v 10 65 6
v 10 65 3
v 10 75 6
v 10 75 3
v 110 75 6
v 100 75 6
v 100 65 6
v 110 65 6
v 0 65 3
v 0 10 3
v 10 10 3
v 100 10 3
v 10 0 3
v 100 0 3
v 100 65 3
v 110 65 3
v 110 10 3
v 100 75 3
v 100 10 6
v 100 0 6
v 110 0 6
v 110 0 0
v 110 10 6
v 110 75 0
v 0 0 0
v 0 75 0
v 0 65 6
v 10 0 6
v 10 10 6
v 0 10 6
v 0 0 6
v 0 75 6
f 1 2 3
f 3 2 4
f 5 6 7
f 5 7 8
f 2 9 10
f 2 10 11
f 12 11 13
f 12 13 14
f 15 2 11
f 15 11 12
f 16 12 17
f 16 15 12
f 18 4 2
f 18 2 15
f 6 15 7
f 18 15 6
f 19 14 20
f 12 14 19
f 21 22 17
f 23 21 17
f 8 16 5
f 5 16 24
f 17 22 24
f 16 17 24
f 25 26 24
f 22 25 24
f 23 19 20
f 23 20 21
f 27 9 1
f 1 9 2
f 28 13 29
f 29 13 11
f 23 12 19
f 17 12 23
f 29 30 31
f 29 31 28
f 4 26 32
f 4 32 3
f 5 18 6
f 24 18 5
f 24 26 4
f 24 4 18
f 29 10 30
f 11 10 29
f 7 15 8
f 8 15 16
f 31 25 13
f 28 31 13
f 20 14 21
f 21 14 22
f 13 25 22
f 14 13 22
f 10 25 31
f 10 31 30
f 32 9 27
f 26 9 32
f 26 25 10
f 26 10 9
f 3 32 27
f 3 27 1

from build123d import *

# Parameters (mm, degrees)
BOX001_W     = 10
BOX001_H     = 10
BOX001_DEPTH = 6
BOX002_W     = 10
BOX002_H     = 10
BOX002_DEPTH = 6
BOX003_W     = 110
BOX003_H     = 75
BOX003_DEPTH = 3
BOX004_W     = 10
BOX004_H     = 10
BOX004_DEPTH = 6
BOX005_W     = 10
BOX005_H     = 10
BOX005_DEPTH = 6
BOX_W        = 110
BOX_H        = 75
BOX_DEPTH    = 3


with BuildPart() as cube001:
    # Box001 → Box001 (new body)
    with BuildSketch(Plane.XY):
        with Locations((5, 5)):
            Rectangle(BOX001_W, BOX001_H)
    extrude(amount=BOX001_DEPTH)


with BuildPart() as cube002:
    # Box002 → Box002 (new body)
    with BuildSketch(Plane(origin=(0, 65, 0), x_dir=(1, 0, 0), z_dir=(0, 0, 1))):
        with Locations((5, 5)):
            Rectangle(BOX002_W, BOX002_H)
    extrude(amount=BOX002_DEPTH)


with BuildPart() as cube003:
    # Box003 → Box003 (new body)
    with BuildSketch(Plane.XY):
        with Locations((55, 37.5)):
            Rectangle(BOX003_W, BOX003_H)
    extrude(amount=BOX003_DEPTH)


with BuildPart() as cube004:
    # Box004 → Box004 (new body)
    with BuildSketch(Plane(origin=(100, 65, 0), x_dir=(1, 0, 0), z_dir=(0, 0, 1))):
        with Locations((5, 5)):
            Rectangle(BOX004_W, BOX004_H)
    extrude(amount=BOX004_DEPTH)


with BuildPart() as cube005:
    # Box005 → Box005 (new body)
    with BuildSketch(Plane(origin=(100, 0, 0), x_dir=(1, 0, 0), z_dir=(0, 0, 1))):
        with Locations((5, 5)):
            Rectangle(BOX005_W, BOX005_H)
    extrude(amount=BOX005_DEPTH)


with BuildPart() as fusion:
    # Box → Box (new body)
    with BuildSketch(Plane.XY):
        with Locations((55, 37.5)):
            Rectangle(BOX_W, BOX_H)
    extrude(amount=BOX_DEPTH)

    # Fusion: union Cube001, Cube002, Cube003, Cube004, Cube005
    add(cube001.part)
    add(cube002.part)
    add(cube003.part)
    add(cube004.part)
    add(cube005.part)


solid = fusion.part
